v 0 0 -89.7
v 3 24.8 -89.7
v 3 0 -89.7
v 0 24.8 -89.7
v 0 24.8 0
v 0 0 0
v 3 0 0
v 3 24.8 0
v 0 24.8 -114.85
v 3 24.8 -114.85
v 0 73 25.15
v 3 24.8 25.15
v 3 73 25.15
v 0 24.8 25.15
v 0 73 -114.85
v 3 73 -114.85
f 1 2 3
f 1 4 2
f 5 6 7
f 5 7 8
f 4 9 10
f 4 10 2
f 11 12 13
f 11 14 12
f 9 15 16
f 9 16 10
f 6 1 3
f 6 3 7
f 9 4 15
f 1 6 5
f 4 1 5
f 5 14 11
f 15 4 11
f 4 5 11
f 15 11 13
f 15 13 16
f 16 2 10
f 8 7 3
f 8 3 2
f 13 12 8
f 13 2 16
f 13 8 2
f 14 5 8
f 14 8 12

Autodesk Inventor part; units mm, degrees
ref_plane "YZ Plane" through (0, 0, 0) normal (1, 0, 0) x (0, 1, 0)
ref_plane "XZ Plane" through (0, 0, 0) normal (0, 1, 0) x (-1, 0, 0)
ref_plane "XY Plane" through (0, 0, 0) normal (0, 0, 1) x (1, 0, 0)
sketch "Boceto1" plane through (0, 0, 0) normal (1, 0, 0) x (0, 1, 0)
  line L0 (0, 0) -> (24.8, 0)
  line L1 (24.8, 0) -> (24.8, -89.7)
  line L2 (24.8, -89.7) -> (0, -89.7)
  line L3 (0, -89.7) -> (0, 0)
  line L4 (0, -44.85) -> (73, -44.85) construction
  line L5 (24.8, -44.85) -> (73, -44.85) construction
  line L6 (24.8, 25.15) -> (73, 25.15)
  line L7 (73, 25.15) -> (73, -114.85)
  line L8 (73, -114.85) -> (24.8, -114.85)
  line L9 (24.8, -114.85) -> (24.8, 25.15)
  line L10 (24.8, 25.15) -> (73, -114.85) construction
  line L11 (73, 25.15) -> (24.8, -114.85) construction
  point P0 (48.9, -44.85)
  dimension "d0" = 24.8
  dimension "d1" = 89.7
  dimension "d2" = 73
  dimension "d3" = 140
extrude "Extrusión1" add sketch "Boceto1" along normal blind 3
